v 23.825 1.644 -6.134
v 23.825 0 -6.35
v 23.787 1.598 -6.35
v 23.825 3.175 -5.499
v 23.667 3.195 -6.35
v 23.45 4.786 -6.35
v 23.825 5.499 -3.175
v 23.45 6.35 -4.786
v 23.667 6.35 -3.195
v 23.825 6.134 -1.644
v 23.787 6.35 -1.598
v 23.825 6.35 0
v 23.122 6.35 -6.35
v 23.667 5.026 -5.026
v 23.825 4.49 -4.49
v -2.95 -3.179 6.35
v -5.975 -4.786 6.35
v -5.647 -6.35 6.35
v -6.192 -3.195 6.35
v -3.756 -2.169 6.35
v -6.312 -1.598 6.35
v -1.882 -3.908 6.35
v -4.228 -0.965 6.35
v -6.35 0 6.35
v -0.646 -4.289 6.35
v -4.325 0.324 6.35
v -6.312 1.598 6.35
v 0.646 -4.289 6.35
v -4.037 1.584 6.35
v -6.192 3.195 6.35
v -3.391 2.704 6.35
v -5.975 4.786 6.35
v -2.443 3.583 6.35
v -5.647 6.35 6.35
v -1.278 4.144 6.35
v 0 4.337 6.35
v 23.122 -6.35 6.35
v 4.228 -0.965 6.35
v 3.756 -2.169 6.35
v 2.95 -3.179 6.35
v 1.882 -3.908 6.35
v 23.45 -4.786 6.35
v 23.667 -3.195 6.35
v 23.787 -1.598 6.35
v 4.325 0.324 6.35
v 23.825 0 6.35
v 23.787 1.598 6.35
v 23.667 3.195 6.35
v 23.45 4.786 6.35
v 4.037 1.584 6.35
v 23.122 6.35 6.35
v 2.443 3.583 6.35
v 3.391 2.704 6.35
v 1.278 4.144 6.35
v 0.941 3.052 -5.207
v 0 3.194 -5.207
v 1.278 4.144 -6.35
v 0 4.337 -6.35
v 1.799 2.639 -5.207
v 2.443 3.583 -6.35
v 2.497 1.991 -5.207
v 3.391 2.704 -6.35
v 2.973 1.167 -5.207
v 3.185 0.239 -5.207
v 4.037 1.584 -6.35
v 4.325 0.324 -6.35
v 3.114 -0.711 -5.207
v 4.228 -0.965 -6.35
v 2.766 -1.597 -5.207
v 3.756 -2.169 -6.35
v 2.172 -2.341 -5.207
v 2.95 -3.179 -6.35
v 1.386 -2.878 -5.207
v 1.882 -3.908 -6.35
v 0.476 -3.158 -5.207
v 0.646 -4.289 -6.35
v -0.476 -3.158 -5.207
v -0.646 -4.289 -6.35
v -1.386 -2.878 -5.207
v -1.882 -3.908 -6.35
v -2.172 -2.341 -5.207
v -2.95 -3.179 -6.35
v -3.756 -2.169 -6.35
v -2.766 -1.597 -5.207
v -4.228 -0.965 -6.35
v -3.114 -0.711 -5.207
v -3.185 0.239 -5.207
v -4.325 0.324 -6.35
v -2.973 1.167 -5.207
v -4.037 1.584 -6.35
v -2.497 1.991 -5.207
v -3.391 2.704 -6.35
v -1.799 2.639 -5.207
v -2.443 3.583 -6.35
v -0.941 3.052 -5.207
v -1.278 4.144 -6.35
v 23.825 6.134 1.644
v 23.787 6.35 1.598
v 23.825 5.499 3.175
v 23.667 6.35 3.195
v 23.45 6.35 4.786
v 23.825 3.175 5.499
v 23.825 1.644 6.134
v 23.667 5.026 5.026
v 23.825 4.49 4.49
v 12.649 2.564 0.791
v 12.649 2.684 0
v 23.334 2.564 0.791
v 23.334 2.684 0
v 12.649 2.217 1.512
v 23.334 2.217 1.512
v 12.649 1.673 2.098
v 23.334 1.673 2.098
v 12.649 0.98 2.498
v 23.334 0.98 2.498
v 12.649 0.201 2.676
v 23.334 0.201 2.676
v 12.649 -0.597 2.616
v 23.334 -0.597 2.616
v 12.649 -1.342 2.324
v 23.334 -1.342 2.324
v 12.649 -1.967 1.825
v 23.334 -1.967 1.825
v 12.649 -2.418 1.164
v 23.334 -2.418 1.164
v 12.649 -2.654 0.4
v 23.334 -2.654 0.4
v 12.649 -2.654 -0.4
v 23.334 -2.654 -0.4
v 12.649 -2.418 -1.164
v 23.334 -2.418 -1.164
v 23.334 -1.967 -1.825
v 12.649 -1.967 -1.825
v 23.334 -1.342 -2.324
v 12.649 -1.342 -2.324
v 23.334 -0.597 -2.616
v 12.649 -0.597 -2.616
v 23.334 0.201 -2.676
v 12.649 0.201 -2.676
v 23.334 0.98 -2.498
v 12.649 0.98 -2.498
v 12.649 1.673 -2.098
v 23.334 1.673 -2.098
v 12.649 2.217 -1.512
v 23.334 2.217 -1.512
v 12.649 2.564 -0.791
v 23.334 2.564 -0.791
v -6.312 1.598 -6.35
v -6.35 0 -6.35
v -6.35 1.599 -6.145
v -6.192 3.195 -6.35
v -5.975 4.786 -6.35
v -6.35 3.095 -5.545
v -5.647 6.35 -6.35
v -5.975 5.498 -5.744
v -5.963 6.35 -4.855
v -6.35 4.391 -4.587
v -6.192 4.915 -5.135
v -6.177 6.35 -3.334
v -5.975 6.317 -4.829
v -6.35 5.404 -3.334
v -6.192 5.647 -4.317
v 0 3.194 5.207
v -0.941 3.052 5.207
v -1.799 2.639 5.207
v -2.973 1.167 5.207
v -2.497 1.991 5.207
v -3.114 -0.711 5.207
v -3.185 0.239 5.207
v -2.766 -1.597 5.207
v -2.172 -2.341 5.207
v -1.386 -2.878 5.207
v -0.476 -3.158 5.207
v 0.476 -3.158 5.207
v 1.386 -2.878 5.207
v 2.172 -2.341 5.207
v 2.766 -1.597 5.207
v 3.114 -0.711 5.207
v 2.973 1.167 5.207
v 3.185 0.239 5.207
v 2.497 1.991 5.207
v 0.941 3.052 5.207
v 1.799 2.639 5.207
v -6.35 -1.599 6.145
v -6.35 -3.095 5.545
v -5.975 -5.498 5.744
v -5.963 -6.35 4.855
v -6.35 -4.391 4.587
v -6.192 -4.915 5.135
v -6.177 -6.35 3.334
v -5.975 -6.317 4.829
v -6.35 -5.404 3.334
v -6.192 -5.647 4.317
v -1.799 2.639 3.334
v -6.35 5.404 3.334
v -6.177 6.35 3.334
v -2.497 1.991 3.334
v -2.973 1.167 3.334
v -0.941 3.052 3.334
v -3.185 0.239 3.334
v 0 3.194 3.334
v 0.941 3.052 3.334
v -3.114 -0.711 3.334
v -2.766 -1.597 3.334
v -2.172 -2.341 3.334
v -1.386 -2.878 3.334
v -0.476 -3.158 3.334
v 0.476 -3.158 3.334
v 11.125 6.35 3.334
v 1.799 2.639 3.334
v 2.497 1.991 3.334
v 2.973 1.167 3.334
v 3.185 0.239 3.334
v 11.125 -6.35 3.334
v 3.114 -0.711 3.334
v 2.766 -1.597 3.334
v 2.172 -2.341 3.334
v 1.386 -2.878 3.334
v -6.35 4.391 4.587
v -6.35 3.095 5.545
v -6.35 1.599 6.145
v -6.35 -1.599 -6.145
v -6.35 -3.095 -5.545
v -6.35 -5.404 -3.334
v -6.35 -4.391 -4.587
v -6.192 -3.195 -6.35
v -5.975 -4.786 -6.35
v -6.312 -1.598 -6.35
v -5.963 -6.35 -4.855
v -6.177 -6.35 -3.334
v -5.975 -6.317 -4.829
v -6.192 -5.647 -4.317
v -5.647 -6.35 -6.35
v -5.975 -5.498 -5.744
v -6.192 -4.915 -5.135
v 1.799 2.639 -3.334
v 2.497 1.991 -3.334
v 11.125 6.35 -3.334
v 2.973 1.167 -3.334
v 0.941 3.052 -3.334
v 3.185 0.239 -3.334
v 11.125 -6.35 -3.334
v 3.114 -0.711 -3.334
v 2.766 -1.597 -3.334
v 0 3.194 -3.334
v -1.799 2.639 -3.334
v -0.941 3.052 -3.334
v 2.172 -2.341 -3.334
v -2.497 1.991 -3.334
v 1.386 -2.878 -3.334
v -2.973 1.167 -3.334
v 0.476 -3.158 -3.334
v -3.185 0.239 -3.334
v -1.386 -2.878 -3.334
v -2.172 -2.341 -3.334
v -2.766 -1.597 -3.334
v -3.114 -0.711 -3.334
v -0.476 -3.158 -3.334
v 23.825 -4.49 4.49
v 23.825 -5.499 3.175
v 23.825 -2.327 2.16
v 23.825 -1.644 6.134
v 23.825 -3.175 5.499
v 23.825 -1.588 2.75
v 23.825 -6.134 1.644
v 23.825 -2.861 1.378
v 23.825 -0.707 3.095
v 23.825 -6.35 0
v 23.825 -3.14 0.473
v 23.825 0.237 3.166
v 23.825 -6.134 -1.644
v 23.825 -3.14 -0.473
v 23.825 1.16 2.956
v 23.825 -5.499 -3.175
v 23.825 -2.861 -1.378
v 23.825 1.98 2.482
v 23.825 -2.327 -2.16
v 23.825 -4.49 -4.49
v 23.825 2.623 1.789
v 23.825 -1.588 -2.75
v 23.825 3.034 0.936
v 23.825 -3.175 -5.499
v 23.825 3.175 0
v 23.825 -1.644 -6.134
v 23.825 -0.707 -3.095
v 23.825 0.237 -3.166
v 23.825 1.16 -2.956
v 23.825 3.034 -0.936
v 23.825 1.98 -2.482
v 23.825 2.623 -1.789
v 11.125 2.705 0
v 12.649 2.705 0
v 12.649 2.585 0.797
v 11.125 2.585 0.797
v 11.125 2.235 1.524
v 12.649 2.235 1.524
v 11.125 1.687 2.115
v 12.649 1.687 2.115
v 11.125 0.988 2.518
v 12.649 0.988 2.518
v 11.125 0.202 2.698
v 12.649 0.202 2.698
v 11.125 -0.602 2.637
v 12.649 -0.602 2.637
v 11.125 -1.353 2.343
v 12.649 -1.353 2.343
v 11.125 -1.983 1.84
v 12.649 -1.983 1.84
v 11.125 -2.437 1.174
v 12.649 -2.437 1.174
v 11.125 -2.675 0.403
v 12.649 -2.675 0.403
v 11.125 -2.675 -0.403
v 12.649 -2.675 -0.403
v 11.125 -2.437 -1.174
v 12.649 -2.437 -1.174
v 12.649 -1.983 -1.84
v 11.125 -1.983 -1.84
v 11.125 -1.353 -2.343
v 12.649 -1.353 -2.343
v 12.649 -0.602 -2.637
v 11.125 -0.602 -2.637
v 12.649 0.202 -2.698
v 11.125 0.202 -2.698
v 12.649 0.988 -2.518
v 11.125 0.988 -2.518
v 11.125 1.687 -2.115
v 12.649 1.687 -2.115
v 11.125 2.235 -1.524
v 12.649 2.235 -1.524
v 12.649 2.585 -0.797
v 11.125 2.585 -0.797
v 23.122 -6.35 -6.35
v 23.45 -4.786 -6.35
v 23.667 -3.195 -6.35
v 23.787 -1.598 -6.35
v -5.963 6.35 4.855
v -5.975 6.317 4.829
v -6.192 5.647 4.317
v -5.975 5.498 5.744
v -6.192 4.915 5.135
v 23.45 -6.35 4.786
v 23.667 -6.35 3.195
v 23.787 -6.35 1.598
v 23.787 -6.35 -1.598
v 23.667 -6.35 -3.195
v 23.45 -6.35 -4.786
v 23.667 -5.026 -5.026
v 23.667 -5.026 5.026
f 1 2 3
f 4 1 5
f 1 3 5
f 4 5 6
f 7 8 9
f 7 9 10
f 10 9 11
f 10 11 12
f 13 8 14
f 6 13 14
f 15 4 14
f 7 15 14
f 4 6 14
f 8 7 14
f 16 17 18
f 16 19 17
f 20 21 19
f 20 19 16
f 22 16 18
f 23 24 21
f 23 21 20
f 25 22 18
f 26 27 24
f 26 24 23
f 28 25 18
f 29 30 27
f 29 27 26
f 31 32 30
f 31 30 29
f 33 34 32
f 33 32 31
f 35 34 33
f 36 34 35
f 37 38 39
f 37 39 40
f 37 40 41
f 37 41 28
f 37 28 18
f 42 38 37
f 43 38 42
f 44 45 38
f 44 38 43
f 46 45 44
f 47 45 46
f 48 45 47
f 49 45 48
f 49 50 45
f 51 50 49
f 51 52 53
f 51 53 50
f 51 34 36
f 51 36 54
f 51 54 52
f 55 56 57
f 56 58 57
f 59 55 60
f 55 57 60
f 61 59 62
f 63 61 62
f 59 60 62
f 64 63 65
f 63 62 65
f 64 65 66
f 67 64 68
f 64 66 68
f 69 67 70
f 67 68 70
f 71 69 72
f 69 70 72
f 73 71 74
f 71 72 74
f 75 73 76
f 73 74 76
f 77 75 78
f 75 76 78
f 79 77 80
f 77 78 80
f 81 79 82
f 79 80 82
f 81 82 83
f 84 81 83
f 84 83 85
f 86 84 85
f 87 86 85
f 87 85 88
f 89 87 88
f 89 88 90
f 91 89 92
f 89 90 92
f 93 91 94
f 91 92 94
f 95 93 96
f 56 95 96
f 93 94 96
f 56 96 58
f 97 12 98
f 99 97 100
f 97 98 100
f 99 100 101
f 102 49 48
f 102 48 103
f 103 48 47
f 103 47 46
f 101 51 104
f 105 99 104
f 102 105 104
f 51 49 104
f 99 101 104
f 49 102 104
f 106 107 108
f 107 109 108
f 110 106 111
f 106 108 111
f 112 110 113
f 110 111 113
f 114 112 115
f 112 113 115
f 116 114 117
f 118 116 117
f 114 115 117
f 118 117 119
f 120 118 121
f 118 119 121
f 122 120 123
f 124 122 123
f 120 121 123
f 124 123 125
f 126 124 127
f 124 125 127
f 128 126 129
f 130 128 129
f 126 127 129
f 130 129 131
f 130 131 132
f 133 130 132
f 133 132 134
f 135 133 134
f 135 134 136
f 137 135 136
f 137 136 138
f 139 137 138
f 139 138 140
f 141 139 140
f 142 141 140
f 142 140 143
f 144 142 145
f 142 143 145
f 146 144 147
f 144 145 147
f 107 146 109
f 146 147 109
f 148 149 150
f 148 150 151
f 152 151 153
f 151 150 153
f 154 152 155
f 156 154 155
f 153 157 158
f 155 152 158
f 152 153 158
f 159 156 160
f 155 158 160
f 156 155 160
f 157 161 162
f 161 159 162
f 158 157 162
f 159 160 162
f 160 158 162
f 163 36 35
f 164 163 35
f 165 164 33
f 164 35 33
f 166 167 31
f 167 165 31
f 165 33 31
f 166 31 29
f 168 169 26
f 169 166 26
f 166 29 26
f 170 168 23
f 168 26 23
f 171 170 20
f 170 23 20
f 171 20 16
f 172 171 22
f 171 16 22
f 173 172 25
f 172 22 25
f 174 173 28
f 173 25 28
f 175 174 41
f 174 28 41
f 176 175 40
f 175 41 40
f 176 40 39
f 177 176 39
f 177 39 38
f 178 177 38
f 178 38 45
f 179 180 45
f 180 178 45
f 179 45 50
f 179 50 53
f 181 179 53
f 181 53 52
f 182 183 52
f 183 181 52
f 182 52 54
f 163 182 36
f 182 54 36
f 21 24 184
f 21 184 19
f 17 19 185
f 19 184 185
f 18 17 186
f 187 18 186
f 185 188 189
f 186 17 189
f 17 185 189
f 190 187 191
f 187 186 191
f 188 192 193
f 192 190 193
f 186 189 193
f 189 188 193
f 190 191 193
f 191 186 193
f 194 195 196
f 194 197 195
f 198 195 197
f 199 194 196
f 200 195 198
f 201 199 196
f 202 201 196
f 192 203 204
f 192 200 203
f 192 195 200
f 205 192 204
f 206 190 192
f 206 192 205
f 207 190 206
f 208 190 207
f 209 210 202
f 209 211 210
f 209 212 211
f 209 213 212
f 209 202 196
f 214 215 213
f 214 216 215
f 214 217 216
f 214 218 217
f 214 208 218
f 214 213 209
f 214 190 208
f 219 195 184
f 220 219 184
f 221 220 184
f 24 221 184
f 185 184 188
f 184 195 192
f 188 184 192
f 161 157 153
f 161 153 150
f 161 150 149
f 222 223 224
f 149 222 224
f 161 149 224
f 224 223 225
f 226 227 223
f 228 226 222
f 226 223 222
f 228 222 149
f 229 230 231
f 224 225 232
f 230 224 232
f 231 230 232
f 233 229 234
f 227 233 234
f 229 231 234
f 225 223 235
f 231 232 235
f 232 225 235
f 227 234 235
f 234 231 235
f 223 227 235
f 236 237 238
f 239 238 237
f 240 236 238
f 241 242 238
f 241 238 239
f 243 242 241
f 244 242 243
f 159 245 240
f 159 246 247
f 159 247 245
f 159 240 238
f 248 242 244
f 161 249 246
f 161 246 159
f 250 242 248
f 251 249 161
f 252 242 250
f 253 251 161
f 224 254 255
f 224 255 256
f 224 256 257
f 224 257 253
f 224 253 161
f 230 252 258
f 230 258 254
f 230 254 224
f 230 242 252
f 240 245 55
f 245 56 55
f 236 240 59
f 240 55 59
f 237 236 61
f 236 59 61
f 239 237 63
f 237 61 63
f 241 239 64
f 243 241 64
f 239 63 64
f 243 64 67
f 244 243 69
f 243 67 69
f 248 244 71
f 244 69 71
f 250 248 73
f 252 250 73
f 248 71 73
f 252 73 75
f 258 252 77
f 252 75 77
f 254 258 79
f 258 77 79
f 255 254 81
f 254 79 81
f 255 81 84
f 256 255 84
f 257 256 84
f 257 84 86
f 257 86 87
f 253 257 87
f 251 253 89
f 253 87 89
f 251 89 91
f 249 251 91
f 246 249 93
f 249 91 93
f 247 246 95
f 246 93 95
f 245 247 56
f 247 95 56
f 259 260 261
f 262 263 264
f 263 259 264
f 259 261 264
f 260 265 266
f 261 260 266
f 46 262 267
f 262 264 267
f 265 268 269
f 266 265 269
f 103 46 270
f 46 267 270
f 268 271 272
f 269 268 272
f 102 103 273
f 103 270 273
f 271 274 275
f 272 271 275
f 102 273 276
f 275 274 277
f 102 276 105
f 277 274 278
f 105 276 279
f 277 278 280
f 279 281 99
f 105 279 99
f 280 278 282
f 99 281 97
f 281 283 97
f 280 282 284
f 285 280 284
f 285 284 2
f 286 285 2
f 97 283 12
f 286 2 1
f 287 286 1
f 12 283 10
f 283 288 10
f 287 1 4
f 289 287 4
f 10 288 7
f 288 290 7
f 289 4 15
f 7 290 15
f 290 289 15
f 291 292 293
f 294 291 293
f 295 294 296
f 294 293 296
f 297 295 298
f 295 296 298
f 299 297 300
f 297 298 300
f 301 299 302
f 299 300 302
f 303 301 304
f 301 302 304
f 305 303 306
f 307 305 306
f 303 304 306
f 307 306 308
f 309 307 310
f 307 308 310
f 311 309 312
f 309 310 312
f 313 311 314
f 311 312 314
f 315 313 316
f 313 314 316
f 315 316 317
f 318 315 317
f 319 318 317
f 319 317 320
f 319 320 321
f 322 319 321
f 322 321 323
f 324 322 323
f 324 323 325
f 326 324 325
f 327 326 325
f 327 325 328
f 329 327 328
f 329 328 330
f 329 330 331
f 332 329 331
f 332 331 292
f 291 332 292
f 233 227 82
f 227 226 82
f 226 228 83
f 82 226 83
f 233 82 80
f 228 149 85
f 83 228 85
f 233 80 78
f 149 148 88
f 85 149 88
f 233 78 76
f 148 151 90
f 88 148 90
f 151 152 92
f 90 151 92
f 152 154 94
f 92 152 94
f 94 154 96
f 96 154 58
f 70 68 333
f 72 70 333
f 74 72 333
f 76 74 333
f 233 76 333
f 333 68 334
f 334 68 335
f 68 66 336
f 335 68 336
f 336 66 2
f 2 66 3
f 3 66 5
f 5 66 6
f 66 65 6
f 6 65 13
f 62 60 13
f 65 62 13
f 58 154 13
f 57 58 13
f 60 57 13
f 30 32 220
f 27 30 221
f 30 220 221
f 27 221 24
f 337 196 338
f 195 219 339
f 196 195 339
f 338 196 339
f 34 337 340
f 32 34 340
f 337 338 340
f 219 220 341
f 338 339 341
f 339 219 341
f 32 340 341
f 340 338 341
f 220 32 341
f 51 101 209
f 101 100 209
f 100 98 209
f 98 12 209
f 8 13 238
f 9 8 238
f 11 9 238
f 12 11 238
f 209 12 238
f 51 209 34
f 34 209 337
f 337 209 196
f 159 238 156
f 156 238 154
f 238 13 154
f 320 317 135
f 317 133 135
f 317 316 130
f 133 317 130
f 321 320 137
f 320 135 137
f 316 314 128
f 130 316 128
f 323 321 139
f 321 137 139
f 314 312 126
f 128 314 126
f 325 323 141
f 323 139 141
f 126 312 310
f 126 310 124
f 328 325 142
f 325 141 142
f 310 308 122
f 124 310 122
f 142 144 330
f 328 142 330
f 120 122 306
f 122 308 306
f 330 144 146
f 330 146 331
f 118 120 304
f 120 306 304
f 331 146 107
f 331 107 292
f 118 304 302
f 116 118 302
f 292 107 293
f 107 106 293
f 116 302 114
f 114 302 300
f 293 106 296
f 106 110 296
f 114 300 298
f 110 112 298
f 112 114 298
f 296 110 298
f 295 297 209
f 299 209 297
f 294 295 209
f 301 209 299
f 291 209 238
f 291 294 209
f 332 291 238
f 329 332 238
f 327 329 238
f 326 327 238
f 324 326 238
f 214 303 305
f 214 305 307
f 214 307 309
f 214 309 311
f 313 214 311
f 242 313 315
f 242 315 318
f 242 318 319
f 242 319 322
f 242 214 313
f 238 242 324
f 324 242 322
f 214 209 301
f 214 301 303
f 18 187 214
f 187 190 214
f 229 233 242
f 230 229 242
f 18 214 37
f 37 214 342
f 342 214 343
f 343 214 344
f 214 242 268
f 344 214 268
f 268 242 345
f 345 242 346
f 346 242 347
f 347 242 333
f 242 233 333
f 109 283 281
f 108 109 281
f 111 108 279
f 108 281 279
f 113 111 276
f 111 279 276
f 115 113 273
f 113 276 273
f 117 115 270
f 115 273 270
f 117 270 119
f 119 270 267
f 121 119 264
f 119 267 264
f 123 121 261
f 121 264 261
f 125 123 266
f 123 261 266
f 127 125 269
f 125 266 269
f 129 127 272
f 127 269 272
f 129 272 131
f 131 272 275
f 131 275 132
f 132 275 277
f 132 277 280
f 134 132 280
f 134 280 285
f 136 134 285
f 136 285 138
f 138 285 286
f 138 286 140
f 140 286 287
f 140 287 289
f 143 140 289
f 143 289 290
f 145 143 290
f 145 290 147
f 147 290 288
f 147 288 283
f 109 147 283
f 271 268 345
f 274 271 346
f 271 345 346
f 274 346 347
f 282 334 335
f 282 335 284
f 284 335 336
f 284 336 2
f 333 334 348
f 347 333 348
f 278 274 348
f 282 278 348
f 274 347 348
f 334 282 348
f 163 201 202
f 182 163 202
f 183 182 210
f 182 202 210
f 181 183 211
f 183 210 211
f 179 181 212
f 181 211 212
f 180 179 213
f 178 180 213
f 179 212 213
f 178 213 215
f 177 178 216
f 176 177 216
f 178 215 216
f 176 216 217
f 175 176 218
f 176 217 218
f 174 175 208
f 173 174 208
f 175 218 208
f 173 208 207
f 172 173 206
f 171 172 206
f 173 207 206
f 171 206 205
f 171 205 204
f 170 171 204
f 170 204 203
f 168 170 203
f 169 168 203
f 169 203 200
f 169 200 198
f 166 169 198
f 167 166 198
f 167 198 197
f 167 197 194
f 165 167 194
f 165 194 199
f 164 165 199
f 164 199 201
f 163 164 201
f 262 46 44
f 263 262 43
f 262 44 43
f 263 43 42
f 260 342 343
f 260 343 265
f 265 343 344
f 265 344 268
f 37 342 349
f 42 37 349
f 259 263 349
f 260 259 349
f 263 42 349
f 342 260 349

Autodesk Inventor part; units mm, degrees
sketch "Sketch_1" plane through (0, 0, 0) normal (0, 0, 1) x (1, 0, 0)
  line L0 (-6.35, 6.35) -> (-6.35, -6.35)
  line L1 (-6.35, -6.35) -> (23.8252, -6.35)
  line L2 (23.8252, -6.35) -> (23.8252, 6.35)
  line L3 (23.8252, 6.35) -> (-6.35, 6.35)
extrude "Extrusion1" add sketch "Sketch_1" along normal mid plane 12.7
sketch "Sketch_2" plane through (0, 0, 0) normal (0, 1, 0) x (-1, 0, 0)
  line L0 (6.35, -3.3338) -> (6.35, 3.3338)
  line L1 (6.35, 3.3338) -> (-11.1252, 3.3338)
  line L2 (-11.1252, 3.3338) -> (-11.1252, -3.3338)
  line L3 (-11.1252, -3.3338) -> (6.35, -3.3338)
extrude "Extrusion2" cut sketch "Sketch_2" along normal mid plane 12.7
sketch "Sketch_3" plane through (0, 0, 0) normal (0, 0, 1) x (1, 0, 0)
  line L0 (23.8252, 0) -> (12.6492, 0)
  line L1 (12.6492, 0) -> (12.6492, 2.6835)
  line L2 (12.6492, 2.6835) -> (23.3337, 2.6835)
  line L3 (23.3337, 2.6835) -> (23.8252, 3.175)
  line L4 (23.8252, 3.175) -> (23.8252, 0)
  line L5 (23.8252, 0) -> (12.6492, 0)
revolve "Revolution1" cut sketch "Sketch_3" angle 360 about axis through (23.8252, 0, 0) along (1, 0, 0)
thread "Thread1"
sketch "Sketch_4" plane through (0, 0, 0) normal (0, 0, 1) x (1, 0, 0)
  line L0 (12.6492, 0) -> (11.1252, 0)
  line L1 (11.1252, 0) -> (11.1252, 2.7051)
  line L2 (11.1252, 2.7051) -> (12.6492, 2.7051)
  line L3 (12.6492, 2.7051) -> (12.6492, 0)
  line L4 (12.6492, 0) -> (11.1252, 0)
revolve "Revolution2" cut sketch "Sketch_4" angle 360 about axis through (12.6492, 0, 0) along (1, 0, 0)
sketch "Sketch_5" plane through (0, 0, 0) normal (1, 0, 0) x (0, 1, 0)
  line L0 (0, -6.35) -> (0, 6.35)
  line L1 (0, 6.35) -> (4.337, 6.35)
  line L2 (4.337, 6.35) -> (3.194, 5.207)
  line L3 (3.194, 5.207) -> (3.194, -5.207)
  line L4 (3.194, -5.207) -> (4.337, -6.35)
  line L5 (4.337, -6.35) -> (0, -6.35)
  line L6 (0, -6.35) -> (0, 6.35)
revolve "Revolution3" cut sketch "Sketch_5" angle 360 about axis through (0, 0, -6.35) along (0, 0, -1)
sketch "Sketch_9" plane through (0, 0, 0) normal (0, 0, 1) x (1, 0, 0)
  line L0 (30.1752, 0) -> (23.8252, 0)
  line L1 (23.8252, 0) -> (23.8252, 6.35)
  arc A0 (23.8252, 6.35) -> (21.2852, 12.7) centre (6.6802, 3.175) ccw
  line L2 (21.2852, 12.7) -> (30.1752, 12.7)
  line L3 (30.1752, 12.7) -> (30.1752, 0)
  line L4 (30.1752, 0) -> (23.8252, 0)
revolve "Revolution4" cut sketch "Sketch_9" angle 360 about axis through (30.1752, 0, 0) along (1, 0, 0)
sketch "Sketch_10" plane through (0, 0, 0) normal (0, 0, 1) x (1, 0, 0)
  line L0 (-6.35, 0) -> (-12.7, 0)
  line L1 (-12.7, 0) -> (-12.7, 12.7)
  line L2 (-12.7, 12.7) -> (-3.81, 12.7)
  arc A0 (-3.81, 12.7) -> (-6.35, 6.35) centre (10.795, 3.175) ccw
  line L3 (-6.35, 6.35) -> (-6.35, 0)
  line L4 (-6.35, 0) -> (-12.7, 0)
revolve "Revolution5" cut sketch "Sketch_10" angle 360 about axis through (-6.35, 0, 0) along (1, 0, 0)
ref_plane "th1_XY" through (23.8252, 3.175, 0) normal (0, 0, 1) x (1, 0, 0)
ref_plane "th1_YZ" through (23.8252, 3.175, 0) normal (1, 0, 0) x (0, 1, 0)
ref_plane "th1_ZX" through (23.8252, 3.175, 0) normal (0, 1, 0) x (0, 0, 1)
ref_plane "th2_XY" through (23.8252, -3.175, 0) normal (0, 0, 1) x (1, 0, 0)
ref_plane "th2_YZ" through (23.8252, -3.175, 0) normal (1, 0, 0) x (0, 1, 0)
ref_plane "th2_ZX" through (23.8252, -3.175, 0) normal (0, 1, 0) x (0, 0, 1)
ref_plane "rod_clevis_body_XY" through (0, 0, 0) normal (0, 0, 1) x (1, 0, 0)
ref_plane "rod_clevis_body_YZ" through (0, 0, 0) normal (1, 0, 0) x (0, 1, 0)
ref_plane "rod_clevis_body_ZX" through (0, 0, 0) normal (0, 1, 0) x (0, 0, 1)
ref_plane "piston_rod_clevis_XY" through (23.8252, 0, 0) normal (1, 0, 0) x (0, 0, -1)
ref_plane "piston_rod_clevis_YZ" through (23.8252, 0, 0) normal (0, 0, -1) x (0, 1, 0)
ref_plane "piston_rod_clevis_ZX" through (23.8252, 0, 0) normal (0, 1, 0) x (1, 0, 0)
ref_plane "dummy_XY" through (0, 0, 0) normal (0, 0, 1) x (1, 0, 0)
ref_plane "dummy_YZ" through (0, 0, 0) normal (1, 0, 0) x (0, 1, 0)
ref_plane "dummy_ZX" through (0, 0, 0) normal (0, 1, 0) x (0, 0, 1)
ref_plane "l11_XY" through (23.8252, 6.35, 0) normal (0, 0, 1) x (1, 0, 0)
ref_plane "l11_YZ" through (23.8252, 6.35, 0) normal (1, 0, 0) x (0, 1, 0)
ref_plane "l11_ZX" through (23.8252, 6.35, 0) normal (0, 1, 0) x (0, 0, 1)
ref_plane "l12_XY" through (0, 6.35, 0) normal (0, 0, 1) x (1, 0, 0)
ref_plane "l12_YZ" through (0, 6.35, 0) normal (1, 0, 0) x (0, 1, 0)
ref_plane "l12_ZX" through (0, 6.35, 0) normal (0, 1, 0) x (0, 0, 1)
ref_plane "l1_XY" through (23.8252, 6.35, 0) normal (0, 0, 1) x (1, 0, 0)
ref_plane "l1_YZ" through (23.8252, 6.35, 0) normal (1, 0, 0) x (0, 1, 0)
ref_plane "l1_ZX" through (23.8252, 6.35, 0) normal (0, 1, 0) x (0, 0, 1)
ref_plane "h1_XY" through (-6.35, 6.35, 0) normal (0, 0, 1) x (1, 0, 0)
ref_plane "h1_YZ" through (-6.35, 6.35, 0) normal (1, 0, 0) x (0, 1, 0)
ref_plane "h1_ZX" through (-6.35, 6.35, 0) normal (0, 1, 0) x (0, 0, 1)
ref_plane "l2_XY" through (-6.35, 6.35, 0) normal (0, 0, 1) x (1, 0, 0)
ref_plane "l2_YZ" through (-6.35, 6.35, 0) normal (1, 0, 0) x (0, 1, 0)
ref_plane "l2_ZX" through (-6.35, 6.35, 0) normal (0, 1, 0) x (0, 0, 1)
ref_plane "h2_XY" through (-6.35, -6.35, 0) normal (0, 0, 1) x (1, 0, 0)
ref_plane "h2_YZ" through (-6.35, -6.35, 0) normal (1, 0, 0) x (0, 1, 0)
ref_plane "h2_ZX" through (-6.35, -6.35, 0) normal (0, 1, 0) x (0, 0, 1)
ref_plane "w11_XY" through (-6.35, 0, -3.3338) normal (0, 1, 0) x (1, 0, 0)
ref_plane "w11_YZ" through (-6.35, 0, -3.3338) normal (1, 0, 0) x (0, 0, -1)
ref_plane "w11_ZX" through (-6.35, 0, -3.3338) normal (0, 0, -1) x (0, 1, 0)
ref_plane "w12_XY" through (-6.35, 0, 3.3338) normal (0, 1, 0) x (1, 0, 0)
ref_plane "w12_YZ" through (-6.35, 0, 3.3338) normal (1, 0, 0) x (0, 0, -1)
ref_plane "w12_ZX" through (-6.35, 0, 3.3338) normal (0, 0, -1) x (0, 1, 0)
ref_plane "l21_XY" through (23.8252, 0, 0) normal (0, 1, 0) x (1, 0, 0)
ref_plane "l21_YZ" through (23.8252, 0, 0) normal (1, 0, 0) x (0, 0, -1)
ref_plane "l21_ZX" through (23.8252, 0, 0) normal (0, 0, -1) x (0, 1, 0)
ref_plane "l22_XY" through (11.1252, 0, 0) normal (0, 1, 0) x (1, 0, 0)
ref_plane "l22_YZ" through (11.1252, 0, 0) normal (1, 0, 0) x (0, 0, -1)
ref_plane "l22_ZX" through (11.1252, 0, 0) normal (0, 0, -1) x (0, 1, 0)
ref_plane "w1_XY" through (23.8252, 0, -6.35) normal (0, 1, 0) x (1, 0, 0)
ref_plane "w1_YZ" through (23.8252, 0, -6.35) normal (1, 0, 0) x (0, 0, -1)
ref_plane "w1_ZX" through (23.8252, 0, -6.35) normal (0, 0, -1) x (0, 1, 0)
ref_plane "w2_XY" through (23.8252, 0, 6.35) normal (0, 1, 0) x (1, 0, 0)
ref_plane "w2_YZ" through (23.8252, 0, 6.35) normal (1, 0, 0) x (0, 0, -1)
ref_plane "w2_ZX" through (23.8252, 0, 6.35) normal (0, 0, -1) x (0, 1, 0)
ref_plane "to_cylinder_XY" through (11.1252, 0, 0) normal (1, 0, 0) x (0, 0, -1)
ref_plane "to_cylinder_YZ" through (11.1252, 0, 0) normal (0, 0, -1) x (0, 1, 0)
ref_plane "to_cylinder_ZX" through (11.1252, 0, 0) normal (0, 1, 0) x (1, 0, 0)
properties part number "D-14055"
